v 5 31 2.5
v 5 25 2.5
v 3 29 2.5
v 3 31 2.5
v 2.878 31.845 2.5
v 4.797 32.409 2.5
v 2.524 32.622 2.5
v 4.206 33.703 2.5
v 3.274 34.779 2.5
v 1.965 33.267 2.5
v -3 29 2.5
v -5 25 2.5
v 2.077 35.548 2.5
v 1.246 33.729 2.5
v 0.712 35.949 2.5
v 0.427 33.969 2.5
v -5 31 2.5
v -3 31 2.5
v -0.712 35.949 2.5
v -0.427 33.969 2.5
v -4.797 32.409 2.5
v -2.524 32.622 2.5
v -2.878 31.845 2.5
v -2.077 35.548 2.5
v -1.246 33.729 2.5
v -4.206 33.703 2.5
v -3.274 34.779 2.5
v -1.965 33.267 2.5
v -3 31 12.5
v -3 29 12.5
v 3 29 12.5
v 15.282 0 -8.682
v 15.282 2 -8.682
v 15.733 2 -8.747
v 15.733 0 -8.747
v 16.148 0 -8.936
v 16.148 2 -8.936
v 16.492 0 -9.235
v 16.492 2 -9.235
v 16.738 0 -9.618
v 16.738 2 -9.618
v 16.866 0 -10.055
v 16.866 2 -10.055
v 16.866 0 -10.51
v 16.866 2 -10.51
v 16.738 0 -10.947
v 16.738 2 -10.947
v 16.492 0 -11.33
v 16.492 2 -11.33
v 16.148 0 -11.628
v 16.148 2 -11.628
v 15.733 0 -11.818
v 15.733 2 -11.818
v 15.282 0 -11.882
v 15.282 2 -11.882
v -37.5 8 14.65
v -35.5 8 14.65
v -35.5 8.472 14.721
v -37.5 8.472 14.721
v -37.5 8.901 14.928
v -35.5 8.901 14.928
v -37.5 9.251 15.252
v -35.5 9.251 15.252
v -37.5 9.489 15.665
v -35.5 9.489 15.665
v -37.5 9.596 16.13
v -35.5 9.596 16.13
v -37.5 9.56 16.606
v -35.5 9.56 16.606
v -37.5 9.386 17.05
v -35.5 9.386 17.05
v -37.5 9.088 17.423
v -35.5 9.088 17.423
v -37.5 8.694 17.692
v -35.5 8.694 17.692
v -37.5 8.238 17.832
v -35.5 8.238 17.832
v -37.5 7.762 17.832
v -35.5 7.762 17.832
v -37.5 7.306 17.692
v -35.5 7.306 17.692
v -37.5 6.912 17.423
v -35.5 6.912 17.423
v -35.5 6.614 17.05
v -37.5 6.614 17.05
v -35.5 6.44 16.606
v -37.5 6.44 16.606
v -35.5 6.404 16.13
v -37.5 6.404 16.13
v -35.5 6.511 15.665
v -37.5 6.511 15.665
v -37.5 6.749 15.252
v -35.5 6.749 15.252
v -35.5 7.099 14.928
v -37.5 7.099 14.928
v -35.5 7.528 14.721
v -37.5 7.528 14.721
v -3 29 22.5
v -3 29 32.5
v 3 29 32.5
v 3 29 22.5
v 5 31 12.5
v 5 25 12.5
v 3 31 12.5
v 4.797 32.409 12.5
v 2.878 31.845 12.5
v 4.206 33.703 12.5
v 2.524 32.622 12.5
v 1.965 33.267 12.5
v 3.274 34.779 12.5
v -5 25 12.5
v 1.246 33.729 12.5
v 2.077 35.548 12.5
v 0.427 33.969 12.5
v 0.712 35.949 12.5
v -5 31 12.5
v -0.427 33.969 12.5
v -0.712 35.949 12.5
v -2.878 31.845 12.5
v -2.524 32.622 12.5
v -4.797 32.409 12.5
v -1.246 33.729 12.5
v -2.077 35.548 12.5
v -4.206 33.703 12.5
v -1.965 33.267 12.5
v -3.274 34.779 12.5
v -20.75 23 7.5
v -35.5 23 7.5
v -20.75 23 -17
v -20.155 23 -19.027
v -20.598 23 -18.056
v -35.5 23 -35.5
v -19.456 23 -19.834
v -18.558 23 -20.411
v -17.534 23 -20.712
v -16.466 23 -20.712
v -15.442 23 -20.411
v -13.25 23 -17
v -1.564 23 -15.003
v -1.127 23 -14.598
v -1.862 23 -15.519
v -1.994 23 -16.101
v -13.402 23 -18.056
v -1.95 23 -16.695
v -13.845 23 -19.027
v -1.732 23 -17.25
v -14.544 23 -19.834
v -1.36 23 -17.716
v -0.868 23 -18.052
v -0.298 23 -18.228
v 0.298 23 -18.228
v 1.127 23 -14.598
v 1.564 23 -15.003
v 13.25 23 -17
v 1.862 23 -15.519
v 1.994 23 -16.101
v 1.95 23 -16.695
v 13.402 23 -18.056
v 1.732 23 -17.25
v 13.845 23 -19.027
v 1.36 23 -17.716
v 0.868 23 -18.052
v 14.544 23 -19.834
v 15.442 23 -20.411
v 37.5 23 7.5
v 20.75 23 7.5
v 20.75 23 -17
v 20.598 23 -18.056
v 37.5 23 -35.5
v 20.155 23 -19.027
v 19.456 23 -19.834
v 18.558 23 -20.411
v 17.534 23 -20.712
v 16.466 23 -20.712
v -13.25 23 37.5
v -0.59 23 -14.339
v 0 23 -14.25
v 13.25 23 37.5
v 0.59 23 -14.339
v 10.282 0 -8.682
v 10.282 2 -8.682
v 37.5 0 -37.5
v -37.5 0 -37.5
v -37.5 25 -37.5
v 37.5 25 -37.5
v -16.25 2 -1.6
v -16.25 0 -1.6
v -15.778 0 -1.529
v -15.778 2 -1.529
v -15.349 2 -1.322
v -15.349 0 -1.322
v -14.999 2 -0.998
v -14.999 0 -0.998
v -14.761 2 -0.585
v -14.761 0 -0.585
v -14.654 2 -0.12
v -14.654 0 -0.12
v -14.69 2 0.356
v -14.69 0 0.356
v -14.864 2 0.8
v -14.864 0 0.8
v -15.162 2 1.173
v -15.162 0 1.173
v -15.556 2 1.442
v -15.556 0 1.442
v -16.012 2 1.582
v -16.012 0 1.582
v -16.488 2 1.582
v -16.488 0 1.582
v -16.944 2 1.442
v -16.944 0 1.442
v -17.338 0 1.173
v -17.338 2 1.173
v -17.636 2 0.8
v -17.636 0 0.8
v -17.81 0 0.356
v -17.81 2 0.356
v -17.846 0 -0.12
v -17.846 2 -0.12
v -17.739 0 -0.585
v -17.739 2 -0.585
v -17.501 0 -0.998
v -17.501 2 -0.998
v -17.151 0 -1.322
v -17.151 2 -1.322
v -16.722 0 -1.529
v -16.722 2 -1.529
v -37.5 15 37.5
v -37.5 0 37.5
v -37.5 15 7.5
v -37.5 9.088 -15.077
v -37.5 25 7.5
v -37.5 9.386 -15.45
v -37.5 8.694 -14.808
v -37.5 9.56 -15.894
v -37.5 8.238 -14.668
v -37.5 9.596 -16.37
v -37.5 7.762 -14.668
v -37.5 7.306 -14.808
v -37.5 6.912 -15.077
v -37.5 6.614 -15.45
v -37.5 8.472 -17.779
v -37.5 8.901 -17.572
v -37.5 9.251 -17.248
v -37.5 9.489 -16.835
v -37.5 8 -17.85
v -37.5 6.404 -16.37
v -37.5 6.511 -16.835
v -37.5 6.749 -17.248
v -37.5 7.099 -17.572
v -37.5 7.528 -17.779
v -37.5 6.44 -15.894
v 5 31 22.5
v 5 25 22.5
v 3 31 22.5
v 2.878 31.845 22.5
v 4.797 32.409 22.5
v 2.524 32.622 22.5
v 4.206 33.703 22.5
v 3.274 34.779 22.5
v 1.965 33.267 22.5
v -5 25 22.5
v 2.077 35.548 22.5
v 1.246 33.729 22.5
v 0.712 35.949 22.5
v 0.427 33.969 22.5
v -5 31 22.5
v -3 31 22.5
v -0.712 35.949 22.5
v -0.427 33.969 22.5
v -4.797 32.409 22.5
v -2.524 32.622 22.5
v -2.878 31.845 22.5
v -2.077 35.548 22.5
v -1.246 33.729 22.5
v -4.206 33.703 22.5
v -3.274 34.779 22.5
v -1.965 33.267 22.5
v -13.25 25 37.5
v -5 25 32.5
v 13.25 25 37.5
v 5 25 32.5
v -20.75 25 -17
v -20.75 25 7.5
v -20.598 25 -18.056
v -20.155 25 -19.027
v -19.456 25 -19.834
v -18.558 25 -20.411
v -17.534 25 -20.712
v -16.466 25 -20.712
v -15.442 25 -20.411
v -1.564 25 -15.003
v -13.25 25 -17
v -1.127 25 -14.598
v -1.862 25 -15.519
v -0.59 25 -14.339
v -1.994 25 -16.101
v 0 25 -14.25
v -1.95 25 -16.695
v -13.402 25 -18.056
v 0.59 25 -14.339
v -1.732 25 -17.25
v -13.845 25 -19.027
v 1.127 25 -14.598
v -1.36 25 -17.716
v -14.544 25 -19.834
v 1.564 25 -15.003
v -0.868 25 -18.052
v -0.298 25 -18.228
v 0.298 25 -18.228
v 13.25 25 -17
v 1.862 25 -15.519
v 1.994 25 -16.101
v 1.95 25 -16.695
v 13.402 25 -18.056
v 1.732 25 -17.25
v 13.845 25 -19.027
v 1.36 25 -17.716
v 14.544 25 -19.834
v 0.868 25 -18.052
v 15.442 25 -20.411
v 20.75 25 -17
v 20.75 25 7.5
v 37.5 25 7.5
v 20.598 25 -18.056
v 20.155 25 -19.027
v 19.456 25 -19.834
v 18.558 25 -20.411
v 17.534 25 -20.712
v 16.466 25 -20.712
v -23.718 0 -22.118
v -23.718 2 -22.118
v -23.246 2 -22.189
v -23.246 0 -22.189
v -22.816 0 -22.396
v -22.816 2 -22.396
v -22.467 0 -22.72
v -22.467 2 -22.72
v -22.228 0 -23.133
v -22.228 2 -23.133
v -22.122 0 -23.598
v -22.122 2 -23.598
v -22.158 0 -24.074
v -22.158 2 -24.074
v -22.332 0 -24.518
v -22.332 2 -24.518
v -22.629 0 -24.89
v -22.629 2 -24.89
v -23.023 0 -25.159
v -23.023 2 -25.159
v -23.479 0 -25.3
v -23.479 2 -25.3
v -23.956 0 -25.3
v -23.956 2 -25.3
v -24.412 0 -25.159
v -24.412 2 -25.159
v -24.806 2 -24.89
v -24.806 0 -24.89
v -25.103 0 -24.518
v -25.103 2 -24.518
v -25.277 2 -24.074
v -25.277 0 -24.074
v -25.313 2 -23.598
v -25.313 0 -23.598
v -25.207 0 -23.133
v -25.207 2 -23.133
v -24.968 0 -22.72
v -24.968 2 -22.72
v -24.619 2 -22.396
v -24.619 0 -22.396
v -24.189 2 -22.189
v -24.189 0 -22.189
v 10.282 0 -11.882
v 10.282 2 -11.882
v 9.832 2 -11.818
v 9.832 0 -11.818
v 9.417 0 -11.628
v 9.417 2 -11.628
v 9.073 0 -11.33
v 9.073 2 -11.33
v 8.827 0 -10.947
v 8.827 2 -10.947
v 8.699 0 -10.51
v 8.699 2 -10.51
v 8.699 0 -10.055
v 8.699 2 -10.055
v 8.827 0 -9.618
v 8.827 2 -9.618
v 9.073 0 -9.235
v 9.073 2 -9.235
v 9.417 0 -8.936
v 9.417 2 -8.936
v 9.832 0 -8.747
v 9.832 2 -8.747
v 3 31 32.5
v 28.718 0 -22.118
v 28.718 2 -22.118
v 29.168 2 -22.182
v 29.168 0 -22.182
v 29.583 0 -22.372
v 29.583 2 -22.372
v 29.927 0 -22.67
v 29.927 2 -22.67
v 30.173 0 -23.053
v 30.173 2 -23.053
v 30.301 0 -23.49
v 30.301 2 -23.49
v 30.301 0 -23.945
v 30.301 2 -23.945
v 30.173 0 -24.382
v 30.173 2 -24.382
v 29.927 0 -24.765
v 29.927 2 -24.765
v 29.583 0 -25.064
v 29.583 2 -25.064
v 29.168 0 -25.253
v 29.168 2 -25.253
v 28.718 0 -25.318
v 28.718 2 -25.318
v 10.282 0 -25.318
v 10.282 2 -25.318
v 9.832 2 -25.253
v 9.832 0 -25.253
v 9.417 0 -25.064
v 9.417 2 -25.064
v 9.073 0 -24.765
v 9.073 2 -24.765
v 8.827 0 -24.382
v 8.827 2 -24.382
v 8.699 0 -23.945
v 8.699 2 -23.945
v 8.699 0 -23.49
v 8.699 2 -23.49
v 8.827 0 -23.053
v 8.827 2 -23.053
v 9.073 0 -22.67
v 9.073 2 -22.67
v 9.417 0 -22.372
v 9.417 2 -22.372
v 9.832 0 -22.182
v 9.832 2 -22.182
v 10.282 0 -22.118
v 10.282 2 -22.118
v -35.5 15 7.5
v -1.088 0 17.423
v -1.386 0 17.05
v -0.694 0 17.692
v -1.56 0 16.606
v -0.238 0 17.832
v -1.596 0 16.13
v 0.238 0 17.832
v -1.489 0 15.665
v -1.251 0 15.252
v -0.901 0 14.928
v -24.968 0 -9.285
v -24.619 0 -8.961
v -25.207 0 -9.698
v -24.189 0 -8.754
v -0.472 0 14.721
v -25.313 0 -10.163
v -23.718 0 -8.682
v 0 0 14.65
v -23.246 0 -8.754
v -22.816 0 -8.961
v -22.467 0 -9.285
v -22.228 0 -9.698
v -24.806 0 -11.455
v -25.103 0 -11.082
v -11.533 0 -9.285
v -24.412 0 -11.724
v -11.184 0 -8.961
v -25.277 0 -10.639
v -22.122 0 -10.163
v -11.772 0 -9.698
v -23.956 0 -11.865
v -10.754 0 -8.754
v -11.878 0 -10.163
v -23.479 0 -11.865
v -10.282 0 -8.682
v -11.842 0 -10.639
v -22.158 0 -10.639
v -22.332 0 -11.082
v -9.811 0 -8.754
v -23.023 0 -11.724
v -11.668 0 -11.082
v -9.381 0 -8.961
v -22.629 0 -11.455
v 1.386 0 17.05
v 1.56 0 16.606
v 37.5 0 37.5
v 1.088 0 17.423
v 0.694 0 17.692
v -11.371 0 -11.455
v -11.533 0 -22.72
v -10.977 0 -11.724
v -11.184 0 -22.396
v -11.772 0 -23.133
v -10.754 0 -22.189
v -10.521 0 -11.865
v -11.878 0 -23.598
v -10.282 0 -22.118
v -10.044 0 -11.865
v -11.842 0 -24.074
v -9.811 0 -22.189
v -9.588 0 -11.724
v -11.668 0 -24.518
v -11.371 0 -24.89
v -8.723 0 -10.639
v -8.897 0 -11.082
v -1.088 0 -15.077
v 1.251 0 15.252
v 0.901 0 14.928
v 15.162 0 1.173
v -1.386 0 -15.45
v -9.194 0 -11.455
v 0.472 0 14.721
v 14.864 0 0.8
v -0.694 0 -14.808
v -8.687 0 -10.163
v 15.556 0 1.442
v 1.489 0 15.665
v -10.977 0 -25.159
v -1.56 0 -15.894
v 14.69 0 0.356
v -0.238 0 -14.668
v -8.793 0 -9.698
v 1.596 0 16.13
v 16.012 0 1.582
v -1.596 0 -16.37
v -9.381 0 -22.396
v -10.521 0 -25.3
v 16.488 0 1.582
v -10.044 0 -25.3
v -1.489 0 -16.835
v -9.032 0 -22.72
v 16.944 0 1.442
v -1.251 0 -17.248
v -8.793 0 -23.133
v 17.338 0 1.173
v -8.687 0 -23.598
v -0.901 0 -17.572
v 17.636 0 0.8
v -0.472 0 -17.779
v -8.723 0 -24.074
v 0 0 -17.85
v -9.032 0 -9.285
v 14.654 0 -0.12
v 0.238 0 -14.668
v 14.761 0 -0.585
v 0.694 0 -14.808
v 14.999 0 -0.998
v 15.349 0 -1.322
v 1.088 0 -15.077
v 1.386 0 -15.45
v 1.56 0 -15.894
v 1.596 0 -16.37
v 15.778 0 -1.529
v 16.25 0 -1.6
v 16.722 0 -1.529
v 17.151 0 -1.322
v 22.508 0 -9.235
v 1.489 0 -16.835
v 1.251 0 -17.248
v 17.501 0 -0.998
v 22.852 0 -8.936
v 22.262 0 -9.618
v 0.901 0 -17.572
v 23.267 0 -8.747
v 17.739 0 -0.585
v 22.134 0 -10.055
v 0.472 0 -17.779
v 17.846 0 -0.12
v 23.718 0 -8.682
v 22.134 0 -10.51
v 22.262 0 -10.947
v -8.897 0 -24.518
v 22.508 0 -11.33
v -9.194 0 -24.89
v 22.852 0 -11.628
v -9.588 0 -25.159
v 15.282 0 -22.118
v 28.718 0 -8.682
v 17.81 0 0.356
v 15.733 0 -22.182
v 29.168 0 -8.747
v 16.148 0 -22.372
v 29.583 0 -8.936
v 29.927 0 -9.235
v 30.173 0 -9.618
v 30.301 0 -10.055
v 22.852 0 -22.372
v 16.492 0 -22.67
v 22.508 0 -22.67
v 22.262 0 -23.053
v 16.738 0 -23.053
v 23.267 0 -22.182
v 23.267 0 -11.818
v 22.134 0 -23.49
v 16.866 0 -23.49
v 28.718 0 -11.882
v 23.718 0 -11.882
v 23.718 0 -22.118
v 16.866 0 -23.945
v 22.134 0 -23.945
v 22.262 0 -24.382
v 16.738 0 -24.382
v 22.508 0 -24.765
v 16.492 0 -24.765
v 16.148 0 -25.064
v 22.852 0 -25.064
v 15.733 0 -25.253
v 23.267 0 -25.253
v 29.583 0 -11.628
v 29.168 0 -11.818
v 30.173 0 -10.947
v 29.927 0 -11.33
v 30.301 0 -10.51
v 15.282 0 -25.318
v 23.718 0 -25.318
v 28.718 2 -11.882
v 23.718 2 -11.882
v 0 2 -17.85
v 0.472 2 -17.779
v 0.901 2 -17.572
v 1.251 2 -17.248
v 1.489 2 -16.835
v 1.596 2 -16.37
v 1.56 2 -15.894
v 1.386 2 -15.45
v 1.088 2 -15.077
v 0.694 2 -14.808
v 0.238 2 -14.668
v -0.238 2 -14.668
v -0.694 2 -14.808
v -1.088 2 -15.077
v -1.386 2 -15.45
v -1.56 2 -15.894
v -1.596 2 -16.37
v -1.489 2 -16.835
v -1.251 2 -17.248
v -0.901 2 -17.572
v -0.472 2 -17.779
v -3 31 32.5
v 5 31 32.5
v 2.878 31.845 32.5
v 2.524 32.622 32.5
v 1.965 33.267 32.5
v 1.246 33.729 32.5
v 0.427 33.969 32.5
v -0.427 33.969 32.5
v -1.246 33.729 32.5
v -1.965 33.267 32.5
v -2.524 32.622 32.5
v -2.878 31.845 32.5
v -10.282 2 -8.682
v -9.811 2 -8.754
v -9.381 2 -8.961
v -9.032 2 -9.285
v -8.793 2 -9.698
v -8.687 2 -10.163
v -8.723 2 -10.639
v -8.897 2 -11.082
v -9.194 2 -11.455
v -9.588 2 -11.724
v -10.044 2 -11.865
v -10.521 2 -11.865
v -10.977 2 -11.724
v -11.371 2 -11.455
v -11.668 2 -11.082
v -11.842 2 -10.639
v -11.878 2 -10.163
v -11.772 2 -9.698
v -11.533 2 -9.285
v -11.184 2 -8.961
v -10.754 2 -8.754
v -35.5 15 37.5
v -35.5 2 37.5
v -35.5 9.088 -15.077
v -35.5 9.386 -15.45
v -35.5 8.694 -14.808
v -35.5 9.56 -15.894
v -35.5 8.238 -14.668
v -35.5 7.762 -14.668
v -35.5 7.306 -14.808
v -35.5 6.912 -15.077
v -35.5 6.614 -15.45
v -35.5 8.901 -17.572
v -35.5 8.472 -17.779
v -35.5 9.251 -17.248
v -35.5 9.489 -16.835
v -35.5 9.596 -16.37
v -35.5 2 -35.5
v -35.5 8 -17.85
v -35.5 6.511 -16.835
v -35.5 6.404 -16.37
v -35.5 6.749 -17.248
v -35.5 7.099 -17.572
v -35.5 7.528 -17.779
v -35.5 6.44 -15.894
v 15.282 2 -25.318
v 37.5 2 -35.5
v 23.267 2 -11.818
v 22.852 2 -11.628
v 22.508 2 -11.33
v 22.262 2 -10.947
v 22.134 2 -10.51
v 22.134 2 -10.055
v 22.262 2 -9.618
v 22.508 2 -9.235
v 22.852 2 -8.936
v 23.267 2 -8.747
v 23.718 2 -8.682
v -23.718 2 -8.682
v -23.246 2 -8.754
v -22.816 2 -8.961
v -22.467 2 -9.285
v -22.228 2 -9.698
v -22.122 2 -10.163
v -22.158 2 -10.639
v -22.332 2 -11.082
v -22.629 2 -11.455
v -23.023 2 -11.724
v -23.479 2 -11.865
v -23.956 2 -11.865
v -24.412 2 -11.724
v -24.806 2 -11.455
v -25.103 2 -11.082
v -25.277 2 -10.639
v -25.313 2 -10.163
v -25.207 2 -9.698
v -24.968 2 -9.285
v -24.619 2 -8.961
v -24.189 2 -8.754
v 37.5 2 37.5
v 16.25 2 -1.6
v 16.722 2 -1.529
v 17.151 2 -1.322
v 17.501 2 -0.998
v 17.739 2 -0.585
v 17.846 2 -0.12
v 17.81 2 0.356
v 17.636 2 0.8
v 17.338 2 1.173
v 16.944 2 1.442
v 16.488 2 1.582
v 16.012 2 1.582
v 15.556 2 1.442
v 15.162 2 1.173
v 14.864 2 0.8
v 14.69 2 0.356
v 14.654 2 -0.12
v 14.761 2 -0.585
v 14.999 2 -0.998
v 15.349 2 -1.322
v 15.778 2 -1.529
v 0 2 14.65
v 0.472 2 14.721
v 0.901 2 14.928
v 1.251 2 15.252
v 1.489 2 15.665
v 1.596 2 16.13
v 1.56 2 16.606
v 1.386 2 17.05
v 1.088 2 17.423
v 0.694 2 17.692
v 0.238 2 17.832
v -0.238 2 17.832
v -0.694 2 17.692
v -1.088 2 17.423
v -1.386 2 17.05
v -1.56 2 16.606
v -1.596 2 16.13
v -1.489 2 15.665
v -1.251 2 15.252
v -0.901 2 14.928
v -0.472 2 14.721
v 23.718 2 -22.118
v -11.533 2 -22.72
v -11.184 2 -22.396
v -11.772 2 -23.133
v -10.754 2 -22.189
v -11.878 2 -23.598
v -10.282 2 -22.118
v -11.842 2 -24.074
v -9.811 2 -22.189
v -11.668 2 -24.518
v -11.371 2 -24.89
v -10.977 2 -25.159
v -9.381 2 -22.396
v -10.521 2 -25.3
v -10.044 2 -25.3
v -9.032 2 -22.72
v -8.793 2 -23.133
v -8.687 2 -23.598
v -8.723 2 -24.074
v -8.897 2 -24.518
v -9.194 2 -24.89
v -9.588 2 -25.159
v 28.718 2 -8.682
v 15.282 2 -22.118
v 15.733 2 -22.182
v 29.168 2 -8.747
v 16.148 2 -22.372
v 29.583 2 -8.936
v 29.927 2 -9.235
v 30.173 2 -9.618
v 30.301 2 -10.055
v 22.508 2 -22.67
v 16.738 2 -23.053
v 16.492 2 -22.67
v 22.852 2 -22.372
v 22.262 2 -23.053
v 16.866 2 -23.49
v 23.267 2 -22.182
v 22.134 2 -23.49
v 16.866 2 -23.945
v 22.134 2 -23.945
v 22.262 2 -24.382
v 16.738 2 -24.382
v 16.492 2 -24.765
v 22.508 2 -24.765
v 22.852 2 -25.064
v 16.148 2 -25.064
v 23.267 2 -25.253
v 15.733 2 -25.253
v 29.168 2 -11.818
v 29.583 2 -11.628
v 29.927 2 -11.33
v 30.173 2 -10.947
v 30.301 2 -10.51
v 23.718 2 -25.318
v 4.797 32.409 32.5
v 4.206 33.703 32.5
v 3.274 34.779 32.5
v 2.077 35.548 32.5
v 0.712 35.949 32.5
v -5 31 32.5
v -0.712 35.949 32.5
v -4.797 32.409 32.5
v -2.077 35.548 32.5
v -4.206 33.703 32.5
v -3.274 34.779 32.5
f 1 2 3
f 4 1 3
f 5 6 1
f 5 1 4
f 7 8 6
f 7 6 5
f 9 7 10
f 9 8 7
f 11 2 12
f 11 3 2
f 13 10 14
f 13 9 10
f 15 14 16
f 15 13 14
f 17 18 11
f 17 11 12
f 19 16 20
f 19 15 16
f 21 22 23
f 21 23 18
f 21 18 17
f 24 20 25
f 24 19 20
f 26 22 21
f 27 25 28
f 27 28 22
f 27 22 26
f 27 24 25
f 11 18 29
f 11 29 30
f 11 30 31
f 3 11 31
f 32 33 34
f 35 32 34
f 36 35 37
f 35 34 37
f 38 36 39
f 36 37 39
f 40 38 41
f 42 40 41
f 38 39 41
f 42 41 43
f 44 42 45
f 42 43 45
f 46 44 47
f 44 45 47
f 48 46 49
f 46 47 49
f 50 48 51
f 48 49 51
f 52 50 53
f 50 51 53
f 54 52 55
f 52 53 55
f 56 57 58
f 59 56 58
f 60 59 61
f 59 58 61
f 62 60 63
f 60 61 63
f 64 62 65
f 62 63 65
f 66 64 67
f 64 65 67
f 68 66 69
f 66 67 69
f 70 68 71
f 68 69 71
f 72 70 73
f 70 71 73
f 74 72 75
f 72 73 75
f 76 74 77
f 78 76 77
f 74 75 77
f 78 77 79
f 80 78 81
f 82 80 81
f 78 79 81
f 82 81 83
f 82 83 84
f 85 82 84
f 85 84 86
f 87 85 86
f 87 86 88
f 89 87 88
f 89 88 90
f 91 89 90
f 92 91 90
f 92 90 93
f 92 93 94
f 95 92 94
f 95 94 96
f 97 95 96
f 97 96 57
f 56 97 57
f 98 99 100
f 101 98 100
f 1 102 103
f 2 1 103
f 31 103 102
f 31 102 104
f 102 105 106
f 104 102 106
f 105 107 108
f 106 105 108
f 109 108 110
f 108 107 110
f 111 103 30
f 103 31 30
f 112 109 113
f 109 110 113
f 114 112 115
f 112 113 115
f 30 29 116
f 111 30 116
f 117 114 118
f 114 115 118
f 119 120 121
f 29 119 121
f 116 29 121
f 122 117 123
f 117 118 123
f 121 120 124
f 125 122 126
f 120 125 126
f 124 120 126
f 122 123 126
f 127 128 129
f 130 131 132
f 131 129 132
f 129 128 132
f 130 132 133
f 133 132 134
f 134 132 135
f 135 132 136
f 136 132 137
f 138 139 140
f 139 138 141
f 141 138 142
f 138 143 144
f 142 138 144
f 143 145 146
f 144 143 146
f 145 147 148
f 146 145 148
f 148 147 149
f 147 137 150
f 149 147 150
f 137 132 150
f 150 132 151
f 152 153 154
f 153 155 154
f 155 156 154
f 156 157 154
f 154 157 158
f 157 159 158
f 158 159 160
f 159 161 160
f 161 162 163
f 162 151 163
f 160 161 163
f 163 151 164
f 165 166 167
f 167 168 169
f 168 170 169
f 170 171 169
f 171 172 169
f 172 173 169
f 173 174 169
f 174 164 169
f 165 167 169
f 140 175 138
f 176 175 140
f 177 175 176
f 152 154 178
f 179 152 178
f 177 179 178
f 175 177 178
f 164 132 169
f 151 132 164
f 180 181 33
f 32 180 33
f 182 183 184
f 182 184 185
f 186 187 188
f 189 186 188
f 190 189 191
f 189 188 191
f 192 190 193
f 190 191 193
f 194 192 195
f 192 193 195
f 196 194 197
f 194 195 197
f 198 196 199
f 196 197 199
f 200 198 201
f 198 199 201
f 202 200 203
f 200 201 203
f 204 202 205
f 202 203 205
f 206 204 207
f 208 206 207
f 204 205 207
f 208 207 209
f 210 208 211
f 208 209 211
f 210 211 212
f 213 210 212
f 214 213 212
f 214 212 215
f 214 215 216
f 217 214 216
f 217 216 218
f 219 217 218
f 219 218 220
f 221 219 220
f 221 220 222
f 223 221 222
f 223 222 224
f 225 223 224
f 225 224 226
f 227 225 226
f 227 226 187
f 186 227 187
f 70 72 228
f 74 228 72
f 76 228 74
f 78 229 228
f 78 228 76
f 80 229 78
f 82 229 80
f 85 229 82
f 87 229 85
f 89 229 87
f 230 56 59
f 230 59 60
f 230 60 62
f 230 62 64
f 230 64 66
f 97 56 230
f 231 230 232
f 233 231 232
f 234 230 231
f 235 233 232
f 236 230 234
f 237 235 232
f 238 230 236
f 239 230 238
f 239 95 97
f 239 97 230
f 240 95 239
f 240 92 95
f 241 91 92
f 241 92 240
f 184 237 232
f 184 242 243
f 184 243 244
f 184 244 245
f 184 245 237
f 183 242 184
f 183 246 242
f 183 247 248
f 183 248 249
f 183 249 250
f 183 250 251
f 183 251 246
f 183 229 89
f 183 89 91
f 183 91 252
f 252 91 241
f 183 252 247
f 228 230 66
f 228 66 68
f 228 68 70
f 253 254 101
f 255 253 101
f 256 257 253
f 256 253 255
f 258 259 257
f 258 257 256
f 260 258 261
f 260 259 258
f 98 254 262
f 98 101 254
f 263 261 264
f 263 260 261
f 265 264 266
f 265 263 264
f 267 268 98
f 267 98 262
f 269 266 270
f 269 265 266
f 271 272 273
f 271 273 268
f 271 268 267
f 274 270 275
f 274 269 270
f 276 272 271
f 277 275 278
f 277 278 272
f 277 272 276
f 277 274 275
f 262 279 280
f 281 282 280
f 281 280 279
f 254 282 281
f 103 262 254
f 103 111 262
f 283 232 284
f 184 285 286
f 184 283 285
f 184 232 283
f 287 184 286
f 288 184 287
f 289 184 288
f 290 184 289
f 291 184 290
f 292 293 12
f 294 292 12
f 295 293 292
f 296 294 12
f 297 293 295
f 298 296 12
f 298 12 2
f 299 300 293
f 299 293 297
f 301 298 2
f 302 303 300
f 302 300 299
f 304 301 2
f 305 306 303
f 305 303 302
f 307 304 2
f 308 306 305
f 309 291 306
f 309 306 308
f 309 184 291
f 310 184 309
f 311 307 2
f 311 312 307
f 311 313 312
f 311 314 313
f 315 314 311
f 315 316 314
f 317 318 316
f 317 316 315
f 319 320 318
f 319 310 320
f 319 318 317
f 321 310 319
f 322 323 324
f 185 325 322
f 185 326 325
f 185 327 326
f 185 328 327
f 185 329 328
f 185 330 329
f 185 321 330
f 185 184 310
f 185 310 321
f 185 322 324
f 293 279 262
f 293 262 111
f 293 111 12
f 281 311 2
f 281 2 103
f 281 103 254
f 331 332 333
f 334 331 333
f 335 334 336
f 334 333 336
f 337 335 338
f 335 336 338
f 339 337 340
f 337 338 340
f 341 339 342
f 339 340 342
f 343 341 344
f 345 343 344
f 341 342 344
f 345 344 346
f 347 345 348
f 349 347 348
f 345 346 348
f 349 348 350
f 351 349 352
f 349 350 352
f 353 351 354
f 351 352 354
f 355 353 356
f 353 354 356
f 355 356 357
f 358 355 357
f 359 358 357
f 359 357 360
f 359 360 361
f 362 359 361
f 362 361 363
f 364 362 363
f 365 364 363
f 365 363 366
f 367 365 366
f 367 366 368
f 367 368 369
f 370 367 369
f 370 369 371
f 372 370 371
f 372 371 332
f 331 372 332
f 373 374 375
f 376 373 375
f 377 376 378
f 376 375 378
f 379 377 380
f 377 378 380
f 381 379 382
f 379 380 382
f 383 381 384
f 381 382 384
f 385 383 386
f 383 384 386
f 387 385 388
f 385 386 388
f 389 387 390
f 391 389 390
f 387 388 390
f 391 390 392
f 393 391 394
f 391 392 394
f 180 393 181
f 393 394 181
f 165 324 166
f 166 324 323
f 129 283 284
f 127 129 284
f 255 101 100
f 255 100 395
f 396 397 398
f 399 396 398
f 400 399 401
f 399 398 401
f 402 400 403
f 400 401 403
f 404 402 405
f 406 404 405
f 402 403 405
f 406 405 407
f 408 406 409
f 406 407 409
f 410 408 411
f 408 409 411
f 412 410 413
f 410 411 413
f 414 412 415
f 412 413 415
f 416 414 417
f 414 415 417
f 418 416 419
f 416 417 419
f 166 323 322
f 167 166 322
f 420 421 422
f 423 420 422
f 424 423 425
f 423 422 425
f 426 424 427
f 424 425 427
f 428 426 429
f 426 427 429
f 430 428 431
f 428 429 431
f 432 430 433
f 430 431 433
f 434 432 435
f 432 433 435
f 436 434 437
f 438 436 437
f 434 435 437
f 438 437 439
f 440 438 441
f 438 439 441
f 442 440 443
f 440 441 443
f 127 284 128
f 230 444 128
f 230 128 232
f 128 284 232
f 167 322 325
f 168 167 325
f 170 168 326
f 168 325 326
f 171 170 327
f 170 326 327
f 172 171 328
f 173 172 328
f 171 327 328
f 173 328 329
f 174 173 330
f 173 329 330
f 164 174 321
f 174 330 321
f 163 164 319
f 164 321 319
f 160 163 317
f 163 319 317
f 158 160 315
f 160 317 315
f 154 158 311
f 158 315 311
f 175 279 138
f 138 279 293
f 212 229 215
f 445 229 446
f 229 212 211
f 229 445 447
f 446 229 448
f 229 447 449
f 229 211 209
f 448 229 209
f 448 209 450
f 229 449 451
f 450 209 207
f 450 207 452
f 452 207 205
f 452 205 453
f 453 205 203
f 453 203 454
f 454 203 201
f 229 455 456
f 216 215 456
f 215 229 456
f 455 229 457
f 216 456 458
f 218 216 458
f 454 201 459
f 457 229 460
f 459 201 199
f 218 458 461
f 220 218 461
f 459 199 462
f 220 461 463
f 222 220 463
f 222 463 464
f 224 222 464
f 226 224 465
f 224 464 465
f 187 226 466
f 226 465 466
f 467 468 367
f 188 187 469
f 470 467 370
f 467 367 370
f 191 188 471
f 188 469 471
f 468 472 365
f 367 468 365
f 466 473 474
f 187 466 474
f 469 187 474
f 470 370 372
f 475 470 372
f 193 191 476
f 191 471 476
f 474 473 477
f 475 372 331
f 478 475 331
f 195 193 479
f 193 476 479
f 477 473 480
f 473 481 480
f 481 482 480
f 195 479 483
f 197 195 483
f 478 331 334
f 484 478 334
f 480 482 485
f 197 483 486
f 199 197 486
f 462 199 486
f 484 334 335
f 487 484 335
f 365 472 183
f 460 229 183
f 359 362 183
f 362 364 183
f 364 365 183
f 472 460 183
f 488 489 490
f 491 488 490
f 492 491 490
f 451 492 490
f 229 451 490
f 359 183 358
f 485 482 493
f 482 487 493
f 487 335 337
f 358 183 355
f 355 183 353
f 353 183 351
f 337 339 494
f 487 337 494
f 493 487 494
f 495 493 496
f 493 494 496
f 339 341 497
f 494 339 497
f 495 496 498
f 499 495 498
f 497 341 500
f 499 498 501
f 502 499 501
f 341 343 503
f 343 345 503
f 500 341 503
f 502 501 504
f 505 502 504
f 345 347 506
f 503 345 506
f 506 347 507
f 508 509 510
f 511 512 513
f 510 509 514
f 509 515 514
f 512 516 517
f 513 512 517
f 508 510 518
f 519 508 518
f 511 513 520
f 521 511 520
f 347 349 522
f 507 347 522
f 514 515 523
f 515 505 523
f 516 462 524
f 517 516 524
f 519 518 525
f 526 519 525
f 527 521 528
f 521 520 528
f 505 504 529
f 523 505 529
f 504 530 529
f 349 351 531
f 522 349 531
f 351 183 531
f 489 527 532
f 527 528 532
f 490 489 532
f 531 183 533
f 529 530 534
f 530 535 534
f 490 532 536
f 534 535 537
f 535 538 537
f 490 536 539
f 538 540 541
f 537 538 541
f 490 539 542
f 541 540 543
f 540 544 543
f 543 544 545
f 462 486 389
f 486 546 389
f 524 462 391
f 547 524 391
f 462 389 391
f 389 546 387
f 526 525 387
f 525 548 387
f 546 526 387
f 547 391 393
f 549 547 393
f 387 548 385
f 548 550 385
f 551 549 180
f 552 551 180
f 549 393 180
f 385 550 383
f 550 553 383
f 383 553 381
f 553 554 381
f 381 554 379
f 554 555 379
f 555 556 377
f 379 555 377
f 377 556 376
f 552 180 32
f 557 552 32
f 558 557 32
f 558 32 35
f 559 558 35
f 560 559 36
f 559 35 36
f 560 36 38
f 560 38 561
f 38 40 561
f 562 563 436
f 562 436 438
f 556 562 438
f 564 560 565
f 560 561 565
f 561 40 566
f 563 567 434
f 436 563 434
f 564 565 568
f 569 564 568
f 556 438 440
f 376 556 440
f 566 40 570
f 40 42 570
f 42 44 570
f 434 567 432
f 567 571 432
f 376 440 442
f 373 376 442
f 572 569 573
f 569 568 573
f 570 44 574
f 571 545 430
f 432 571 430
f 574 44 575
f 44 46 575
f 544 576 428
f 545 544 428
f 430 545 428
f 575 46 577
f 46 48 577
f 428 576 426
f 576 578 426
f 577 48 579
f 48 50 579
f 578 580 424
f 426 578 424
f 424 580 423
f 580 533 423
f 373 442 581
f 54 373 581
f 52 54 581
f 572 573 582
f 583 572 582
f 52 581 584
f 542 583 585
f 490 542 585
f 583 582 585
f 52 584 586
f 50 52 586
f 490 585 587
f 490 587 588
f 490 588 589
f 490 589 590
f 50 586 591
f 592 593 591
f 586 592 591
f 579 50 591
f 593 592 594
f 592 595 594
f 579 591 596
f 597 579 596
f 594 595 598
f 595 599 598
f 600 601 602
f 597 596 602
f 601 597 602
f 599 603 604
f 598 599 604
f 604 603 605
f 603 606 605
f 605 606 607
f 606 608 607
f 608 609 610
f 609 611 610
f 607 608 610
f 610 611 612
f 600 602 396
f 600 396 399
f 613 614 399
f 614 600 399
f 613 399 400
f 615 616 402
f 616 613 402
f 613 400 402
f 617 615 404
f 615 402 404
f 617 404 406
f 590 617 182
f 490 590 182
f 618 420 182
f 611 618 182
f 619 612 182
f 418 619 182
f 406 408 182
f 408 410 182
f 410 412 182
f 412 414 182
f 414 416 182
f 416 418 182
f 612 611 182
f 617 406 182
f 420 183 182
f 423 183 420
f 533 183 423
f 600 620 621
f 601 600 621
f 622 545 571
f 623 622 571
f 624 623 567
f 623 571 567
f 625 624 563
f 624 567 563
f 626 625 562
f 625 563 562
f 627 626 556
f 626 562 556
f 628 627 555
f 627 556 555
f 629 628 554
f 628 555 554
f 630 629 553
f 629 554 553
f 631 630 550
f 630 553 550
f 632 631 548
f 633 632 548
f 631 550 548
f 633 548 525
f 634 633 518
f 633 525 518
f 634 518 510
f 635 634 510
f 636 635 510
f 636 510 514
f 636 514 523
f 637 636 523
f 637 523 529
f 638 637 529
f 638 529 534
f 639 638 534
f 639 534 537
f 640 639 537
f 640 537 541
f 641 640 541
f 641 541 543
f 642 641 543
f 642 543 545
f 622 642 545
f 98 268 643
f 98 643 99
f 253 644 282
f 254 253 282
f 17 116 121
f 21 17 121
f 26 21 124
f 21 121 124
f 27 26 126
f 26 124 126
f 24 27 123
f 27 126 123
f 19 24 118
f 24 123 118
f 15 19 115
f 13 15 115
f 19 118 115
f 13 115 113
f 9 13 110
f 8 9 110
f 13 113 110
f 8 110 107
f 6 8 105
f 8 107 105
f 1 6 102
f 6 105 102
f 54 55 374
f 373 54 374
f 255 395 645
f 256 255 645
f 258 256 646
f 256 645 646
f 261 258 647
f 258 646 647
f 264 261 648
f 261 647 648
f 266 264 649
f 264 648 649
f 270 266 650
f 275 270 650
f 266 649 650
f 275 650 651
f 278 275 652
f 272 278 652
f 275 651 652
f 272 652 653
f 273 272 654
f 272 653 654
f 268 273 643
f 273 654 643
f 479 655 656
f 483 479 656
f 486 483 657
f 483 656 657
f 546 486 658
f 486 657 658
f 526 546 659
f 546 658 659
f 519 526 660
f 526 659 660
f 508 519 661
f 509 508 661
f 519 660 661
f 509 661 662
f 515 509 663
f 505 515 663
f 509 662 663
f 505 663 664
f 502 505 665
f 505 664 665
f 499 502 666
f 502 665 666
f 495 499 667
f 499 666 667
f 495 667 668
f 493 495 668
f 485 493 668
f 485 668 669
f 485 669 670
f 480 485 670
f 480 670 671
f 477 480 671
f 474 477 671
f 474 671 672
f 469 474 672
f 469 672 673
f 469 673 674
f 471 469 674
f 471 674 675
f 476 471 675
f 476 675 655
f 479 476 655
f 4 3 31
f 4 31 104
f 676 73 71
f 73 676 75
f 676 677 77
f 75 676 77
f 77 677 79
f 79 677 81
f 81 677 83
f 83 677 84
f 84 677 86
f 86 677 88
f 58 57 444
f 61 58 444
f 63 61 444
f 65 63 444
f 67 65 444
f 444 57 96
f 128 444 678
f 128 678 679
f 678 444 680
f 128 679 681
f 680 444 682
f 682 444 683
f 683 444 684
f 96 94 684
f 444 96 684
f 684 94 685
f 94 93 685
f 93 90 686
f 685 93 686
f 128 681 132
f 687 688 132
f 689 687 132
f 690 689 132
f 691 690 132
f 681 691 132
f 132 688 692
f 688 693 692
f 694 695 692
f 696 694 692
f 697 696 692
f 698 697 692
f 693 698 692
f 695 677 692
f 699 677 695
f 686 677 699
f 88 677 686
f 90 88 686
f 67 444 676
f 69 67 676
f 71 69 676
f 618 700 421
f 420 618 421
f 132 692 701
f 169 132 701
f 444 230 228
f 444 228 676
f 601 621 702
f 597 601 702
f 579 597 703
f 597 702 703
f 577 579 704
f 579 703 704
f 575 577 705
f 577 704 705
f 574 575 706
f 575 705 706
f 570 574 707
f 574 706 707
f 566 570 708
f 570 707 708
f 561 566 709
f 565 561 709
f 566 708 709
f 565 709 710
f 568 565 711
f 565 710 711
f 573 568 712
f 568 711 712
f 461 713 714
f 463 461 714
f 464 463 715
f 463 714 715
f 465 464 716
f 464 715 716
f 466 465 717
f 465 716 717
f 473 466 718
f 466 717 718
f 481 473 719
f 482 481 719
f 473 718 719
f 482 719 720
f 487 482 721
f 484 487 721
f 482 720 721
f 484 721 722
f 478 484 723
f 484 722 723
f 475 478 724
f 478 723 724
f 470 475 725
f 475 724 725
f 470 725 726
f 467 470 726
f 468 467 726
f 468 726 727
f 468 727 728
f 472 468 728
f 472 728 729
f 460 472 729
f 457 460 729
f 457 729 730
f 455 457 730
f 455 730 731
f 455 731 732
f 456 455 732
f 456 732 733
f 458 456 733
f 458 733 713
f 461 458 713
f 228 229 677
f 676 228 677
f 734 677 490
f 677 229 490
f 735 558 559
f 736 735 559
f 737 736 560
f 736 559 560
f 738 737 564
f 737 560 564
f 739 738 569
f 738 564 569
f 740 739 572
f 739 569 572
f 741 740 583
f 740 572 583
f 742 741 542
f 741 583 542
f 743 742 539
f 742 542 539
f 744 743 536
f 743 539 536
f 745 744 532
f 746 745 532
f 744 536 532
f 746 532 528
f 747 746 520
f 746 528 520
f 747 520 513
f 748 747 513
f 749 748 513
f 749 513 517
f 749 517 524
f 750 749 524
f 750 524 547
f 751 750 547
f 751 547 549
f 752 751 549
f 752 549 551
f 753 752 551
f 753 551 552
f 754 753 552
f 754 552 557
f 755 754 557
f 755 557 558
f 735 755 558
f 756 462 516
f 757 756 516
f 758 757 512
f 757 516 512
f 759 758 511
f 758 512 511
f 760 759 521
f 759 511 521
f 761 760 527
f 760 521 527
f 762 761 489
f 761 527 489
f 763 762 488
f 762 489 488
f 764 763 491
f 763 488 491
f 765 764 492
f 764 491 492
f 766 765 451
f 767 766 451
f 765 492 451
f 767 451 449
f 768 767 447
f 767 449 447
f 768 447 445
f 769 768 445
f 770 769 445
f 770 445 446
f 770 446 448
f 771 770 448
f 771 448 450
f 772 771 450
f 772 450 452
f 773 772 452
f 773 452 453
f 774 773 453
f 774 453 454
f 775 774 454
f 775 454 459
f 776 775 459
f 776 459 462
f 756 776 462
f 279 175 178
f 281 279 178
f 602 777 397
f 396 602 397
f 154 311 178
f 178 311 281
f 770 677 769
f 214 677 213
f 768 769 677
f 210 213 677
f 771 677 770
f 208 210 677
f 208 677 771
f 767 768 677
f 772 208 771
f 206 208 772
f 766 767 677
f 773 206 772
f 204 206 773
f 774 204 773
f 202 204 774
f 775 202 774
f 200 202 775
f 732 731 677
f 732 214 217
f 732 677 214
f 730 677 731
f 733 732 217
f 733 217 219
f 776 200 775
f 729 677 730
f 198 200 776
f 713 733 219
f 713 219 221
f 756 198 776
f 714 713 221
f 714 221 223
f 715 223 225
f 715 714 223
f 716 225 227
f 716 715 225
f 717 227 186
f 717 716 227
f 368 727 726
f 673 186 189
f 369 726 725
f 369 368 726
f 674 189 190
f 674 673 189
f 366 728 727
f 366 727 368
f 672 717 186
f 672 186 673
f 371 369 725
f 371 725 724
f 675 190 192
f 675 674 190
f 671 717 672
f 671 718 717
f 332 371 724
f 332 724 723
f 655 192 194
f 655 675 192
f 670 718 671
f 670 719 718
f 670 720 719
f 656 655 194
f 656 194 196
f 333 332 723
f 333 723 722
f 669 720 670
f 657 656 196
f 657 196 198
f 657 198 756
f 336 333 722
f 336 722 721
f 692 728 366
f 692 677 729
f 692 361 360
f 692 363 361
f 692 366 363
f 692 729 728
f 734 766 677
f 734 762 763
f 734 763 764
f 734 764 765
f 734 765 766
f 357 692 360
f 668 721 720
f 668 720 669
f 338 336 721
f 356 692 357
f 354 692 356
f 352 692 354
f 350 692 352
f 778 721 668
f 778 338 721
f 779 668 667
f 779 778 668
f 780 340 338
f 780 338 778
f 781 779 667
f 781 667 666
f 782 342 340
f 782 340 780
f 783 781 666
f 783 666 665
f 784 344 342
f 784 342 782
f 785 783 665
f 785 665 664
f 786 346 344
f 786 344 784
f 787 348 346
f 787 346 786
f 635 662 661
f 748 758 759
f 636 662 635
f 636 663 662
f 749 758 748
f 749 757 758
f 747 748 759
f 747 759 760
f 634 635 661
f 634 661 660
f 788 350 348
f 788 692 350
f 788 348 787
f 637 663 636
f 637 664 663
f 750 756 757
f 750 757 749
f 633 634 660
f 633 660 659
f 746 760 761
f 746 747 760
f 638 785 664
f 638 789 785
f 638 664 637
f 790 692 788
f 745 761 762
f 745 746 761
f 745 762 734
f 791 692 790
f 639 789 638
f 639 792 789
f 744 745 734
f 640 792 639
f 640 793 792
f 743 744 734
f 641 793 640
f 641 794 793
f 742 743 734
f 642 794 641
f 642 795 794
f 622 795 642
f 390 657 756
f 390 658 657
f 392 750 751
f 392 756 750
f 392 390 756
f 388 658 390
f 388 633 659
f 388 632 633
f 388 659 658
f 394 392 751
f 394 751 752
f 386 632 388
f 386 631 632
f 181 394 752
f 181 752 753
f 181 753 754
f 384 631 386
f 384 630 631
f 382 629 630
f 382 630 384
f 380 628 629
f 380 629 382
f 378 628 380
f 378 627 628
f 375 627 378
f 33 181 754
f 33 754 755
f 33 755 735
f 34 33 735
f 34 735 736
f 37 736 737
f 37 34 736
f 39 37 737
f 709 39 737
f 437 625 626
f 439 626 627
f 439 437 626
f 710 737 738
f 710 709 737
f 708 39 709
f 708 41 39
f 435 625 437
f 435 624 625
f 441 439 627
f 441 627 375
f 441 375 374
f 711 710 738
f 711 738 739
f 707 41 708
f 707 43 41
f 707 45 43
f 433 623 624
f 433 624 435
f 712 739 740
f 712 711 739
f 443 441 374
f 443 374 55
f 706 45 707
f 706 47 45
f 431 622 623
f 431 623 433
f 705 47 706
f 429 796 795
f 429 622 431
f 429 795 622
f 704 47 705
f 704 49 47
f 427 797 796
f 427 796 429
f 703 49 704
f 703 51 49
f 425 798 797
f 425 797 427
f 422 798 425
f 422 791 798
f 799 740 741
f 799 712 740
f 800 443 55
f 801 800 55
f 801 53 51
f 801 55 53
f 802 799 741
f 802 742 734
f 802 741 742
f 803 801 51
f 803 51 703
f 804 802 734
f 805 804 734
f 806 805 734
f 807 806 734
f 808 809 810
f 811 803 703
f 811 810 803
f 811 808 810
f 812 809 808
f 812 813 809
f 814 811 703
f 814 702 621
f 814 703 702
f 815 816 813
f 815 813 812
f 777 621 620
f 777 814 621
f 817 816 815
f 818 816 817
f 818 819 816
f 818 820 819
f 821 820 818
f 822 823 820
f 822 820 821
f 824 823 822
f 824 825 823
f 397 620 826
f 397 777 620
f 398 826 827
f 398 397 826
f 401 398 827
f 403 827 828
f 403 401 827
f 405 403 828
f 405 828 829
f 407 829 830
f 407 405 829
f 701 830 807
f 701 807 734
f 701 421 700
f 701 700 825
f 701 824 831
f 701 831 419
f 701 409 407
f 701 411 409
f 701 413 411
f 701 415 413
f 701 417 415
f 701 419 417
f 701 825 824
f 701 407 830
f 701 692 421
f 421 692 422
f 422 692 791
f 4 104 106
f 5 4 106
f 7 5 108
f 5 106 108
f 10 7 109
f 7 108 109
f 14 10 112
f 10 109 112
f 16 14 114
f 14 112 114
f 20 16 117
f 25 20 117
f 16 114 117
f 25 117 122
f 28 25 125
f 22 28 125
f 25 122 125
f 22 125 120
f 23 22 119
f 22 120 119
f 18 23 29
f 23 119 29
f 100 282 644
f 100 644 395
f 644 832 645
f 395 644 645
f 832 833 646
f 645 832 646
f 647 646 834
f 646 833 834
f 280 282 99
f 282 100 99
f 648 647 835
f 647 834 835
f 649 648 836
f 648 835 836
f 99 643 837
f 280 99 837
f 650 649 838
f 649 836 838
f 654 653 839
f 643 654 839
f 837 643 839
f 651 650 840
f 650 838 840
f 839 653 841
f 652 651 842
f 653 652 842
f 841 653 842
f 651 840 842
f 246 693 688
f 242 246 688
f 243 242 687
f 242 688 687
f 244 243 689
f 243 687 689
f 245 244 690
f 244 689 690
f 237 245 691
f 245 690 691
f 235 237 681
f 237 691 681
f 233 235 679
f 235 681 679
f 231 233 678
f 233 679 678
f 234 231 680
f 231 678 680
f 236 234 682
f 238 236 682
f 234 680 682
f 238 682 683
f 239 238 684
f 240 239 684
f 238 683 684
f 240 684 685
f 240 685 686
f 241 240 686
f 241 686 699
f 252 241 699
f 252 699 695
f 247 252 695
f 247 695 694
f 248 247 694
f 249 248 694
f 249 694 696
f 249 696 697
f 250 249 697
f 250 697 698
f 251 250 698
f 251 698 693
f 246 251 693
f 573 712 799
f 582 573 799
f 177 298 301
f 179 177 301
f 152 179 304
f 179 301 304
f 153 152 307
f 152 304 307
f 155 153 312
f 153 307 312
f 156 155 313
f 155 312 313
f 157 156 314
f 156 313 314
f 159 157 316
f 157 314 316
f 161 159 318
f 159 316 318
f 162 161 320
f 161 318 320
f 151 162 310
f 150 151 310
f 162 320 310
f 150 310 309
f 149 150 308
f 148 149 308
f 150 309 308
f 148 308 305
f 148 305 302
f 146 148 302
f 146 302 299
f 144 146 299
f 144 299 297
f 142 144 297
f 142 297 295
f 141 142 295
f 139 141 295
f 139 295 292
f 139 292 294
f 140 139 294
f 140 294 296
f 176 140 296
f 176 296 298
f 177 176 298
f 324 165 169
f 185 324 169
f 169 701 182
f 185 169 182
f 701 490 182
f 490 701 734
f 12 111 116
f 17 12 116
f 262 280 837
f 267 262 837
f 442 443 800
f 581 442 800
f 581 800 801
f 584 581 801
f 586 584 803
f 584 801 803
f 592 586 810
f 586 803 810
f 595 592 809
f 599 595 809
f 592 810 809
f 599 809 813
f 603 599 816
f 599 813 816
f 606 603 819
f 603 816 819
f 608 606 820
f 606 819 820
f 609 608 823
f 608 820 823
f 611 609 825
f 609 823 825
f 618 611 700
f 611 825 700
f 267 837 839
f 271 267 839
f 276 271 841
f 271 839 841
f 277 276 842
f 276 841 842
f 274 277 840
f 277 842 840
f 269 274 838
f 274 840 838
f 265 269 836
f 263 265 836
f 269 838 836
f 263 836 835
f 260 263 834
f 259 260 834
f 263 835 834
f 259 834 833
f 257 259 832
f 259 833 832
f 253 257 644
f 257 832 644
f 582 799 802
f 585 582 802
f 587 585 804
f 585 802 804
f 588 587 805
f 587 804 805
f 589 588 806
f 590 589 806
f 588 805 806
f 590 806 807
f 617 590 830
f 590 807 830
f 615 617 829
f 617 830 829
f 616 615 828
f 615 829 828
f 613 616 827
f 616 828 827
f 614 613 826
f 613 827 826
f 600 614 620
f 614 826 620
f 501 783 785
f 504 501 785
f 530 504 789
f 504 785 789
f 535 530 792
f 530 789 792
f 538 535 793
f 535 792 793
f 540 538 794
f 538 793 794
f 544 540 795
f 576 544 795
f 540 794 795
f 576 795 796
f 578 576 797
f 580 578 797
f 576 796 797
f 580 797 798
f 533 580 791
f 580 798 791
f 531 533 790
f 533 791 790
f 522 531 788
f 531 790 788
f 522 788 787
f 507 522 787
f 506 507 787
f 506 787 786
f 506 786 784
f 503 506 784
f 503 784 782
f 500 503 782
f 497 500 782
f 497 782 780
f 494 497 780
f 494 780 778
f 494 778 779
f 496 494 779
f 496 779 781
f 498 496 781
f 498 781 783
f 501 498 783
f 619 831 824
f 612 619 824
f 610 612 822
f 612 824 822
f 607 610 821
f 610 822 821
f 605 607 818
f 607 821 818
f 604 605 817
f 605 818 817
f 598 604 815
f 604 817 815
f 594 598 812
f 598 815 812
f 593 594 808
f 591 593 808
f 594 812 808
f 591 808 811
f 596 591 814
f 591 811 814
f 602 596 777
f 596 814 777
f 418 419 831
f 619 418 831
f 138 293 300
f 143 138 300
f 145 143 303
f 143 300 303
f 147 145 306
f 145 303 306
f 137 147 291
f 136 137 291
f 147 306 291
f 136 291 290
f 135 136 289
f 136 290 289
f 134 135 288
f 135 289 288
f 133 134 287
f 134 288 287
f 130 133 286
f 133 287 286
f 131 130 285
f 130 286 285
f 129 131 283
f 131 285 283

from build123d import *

# Parameters (mm, degrees)
SKETCH2_W           = 75
SKETCH2_H           = 75
BOSS_EXTRUDE1_DEPTH = 25
SHELL1_T            = -2
SKETCH3_R           = 1.6
CUT_EXTRUDE1_DEPTH  = 50
CUT_EXTRUDE2_DEPTH  = 10
BOSS_EXTRUDE2_START = -5
BOSS_EXTRUDE2_DEPTH = 10
LPATTERN1_COUNT     = 2
LPATTERN1_PITCH     = 20
SKETCH7_R           = 1.6
CUT_EXTRUDE4_DEPTH  = 10
SKETCH9_R           = 1.6
CUT_EXTRUDE5_DEPTH  = 10
SKETCH10_R          = 2
CUT_EXTRUDE6_DEPTH  = 10
CUT_EXTRUDE7_START  = -10
CUT_EXTRUDE7_DEPTH  = 10


with BuildPart() as part:
    # Sketch2 → Boss-Extrude1 (new body)
    with BuildSketch(Plane(origin=(0, 0, 0), x_dir=(1, 0, 0), z_dir=(0, 1, 0))):
        Rectangle(SKETCH2_W, SKETCH2_H)
    extrude(amount=BOSS_EXTRUDE1_DEPTH)

    # Shell1
    shell1_openings = [part.faces().sort_by_distance(p)[0] for p in [
        (0, 12.5, 37.5),
        (37.5, 12.5, 0),
    ]]
    offset(amount=SHELL1_T, openings=shell1_openings, kind=Kind.INTERSECTION)

    # Sketch3 → Cut-Extrude1 (cut)
    with BuildSketch(Plane(origin=(0, 2, 0), x_dir=(1, 0, 0), z_dir=(0, 1, 0))):
        with Locations((-23.717514421, 23.717514421)):
            Circle(SKETCH3_R)
        with Locations((-10.282485579, 23.717514421)):
            Circle(SKETCH3_R)
        with Locations((-10.282485579, 10.282485579)):
            Circle(SKETCH3_R)
        with Locations((-23.717514421, 10.282485579)):
            Circle(SKETCH3_R)
        with Locations((10.282485579, 23.717514421)):
            Circle(SKETCH3_R)
        with Locations((23.717514421, 23.717514421)):
            Circle(SKETCH3_R)
        with Locations((10.282485579, 10.282485579)):
            Circle(SKETCH3_R)
        with Locations((23.717514421, 10.282485579)):
            Circle(SKETCH3_R)
    extrude(amount=-CUT_EXTRUDE1_DEPTH, mode=Mode.SUBTRACT)

    # Sketch4 → Cut-Extrude2 (cut)
    with BuildSketch(Plane(origin=(0, 25, 0), x_dir=(1, 0, 0), z_dir=(0, 1, 0))):
        with BuildLine():
            Line((-37.5, -37.5), (-13.25, -37.5))
            Line((-13.25, -37.5), (-13.25, -7.5))
            Line((-13.25, -7.5), (-13.25, 17))
            ThreePointArc((-13.25, 17), (-17, 20.75), (-20.75, 17))
            Line((-20.75, 17), (-20.75, -7.5))
            Line((-20.75, -7.5), (-37.5, -7.5))
            Line((-37.5, -7.5), (-37.5, -37.5))
        make_face()
        with BuildLine():
            Line((37.5, -37.5), (37.5, -7.5))
            Line((37.5, -7.5), (20.75, -7.5))
            Line((20.75, -7.5), (20.75, 17))
            ThreePointArc((20.75, 17), (17, 20.75), (13.25, 17))
            Line((13.25, 17), (13.25, -7.5))
            Line((13.25, -7.5), (13.25, -37.5))
            Line((13.25, -37.5), (37.5, -37.5))
        make_face()
    extrude(amount=-CUT_EXTRUDE2_DEPTH, mode=Mode.SUBTRACT)

    # Sketch5 → Boss-Extrude2 (add)
    with BuildSketch(Plane.XY.offset(37.5).offset(BOSS_EXTRUDE2_START)):
        with BuildLine():
            Line((-5, 25), (-5, 31))
            ThreePointArc((-5, 31), (0, 36), (5, 31))
            Line((5, 31), (5, 25))
            Line((5, 25), (-5, 25))
        make_face()
        with BuildLine():
            Line((-3, 31), (-3, 29))
            Line((-3, 29), (3, 29))
            Line((3, 29), (3, 31))
            ThreePointArc((3, 31), (0, 34), (-3, 31))
        make_face(mode=Mode.SUBTRACT)
    boss_extrude2 = extrude(amount=-BOSS_EXTRUDE2_DEPTH)

    # LPattern1: Boss-Extrude2 ×2
    with Locations(*[(0, 0, -i * LPATTERN1_PITCH) for i in range(1, LPATTERN1_COUNT)]):
        add(boss_extrude2)

    # Sketch7 → Cut-Extrude4 (cut)
    with BuildSketch(Plane.XZ):
        with Locations((0, 16.25)):
            Circle(SKETCH7_R)
        with Locations((16.25, 0)):
            Circle(SKETCH7_R)
        with Locations((0, -16.25)):
            Circle(SKETCH7_R)
        with Locations((-16.25, 0)):
            Circle(SKETCH7_R)
    extrude(amount=-CUT_EXTRUDE4_DEPTH, mode=Mode.SUBTRACT)

    # Sketch9 → Cut-Extrude5 (cut)
    with BuildSketch(Plane(origin=(-35.5, 0, 0), x_dir=(0, 0, -1), z_dir=(1, 0, 0))):
        with Locations((-16.25, 8)):
            Circle(SKETCH9_R)
        with Locations((16.25, 8)):
            Circle(SKETCH9_R)
    extrude(amount=-CUT_EXTRUDE5_DEPTH, mode=Mode.SUBTRACT)

    # Sketch10 → Cut-Extrude6 (cut)
    with BuildSketch(Plane(origin=(0, 25, 0), x_dir=(1, 0, 0), z_dir=(0, 1, 0))):
        with Locations((0, 16.25)):
            Circle(SKETCH10_R)
    extrude(amount=-CUT_EXTRUDE6_DEPTH, mode=Mode.SUBTRACT)

    # Sketch11 → Cut-Extrude7 (cut)
    with BuildSketch(Plane.XZ.offset(CUT_EXTRUDE7_START)):
        with BuildLine():
            Line((10.282485579, -8.682485579), (15.282485579, -8.682485579))
            ThreePointArc((15.282485579, -8.682485579), (16.882485579, -10.282485579), (15.282485579, -11.882485579))
            Line((15.282485579, -11.882485579), (10.282485579, -11.882485579))
            ThreePointArc((10.282485579, -11.882485579), (8.682485579, -10.282485579), (10.282485579, -8.682485579))
        make_face()
        with BuildLine():
            Line((23.717514421, -8.682485579), (28.717514421, -8.682485579))
            ThreePointArc((28.717514421, -8.682485579), (30.317514421, -10.282485579), (28.717514421, -11.882485579))
            Line((28.717514421, -11.882485579), (23.717514421, -11.882485579))
            ThreePointArc((23.717514421, -11.882485579), (22.117514421, -10.282485579), (23.717514421, -8.682485579))
        make_face()
        with BuildLine():
            Line((23.717514421, -22.117514421), (28.717514421, -22.117514421))
            ThreePointArc((28.717514421, -22.117514421), (30.317514421, -23.717514421), (28.717514421, -25.317514421))
            Line((28.717514421, -25.317514421), (23.717514421, -25.317514421))
            ThreePointArc((23.717514421, -25.317514421), (22.117514421, -23.717514421), (23.717514421, -22.117514421))
        make_face()
        with BuildLine():
            Line((10.282485579, -22.117514421), (15.282485579, -22.117514421))
            ThreePointArc((15.282485579, -22.117514421), (16.882485579, -23.717514421), (15.282485579, -25.317514421))
            Line((15.282485579, -25.317514421), (10.282485579, -25.317514421))
            ThreePointArc((10.282485579, -25.317514421), (8.682485579, -23.717514421), (10.282485579, -22.117514421))
        make_face()
    extrude(amount=CUT_EXTRUDE7_DEPTH, mode=Mode.SUBTRACT)


solid = part.part
